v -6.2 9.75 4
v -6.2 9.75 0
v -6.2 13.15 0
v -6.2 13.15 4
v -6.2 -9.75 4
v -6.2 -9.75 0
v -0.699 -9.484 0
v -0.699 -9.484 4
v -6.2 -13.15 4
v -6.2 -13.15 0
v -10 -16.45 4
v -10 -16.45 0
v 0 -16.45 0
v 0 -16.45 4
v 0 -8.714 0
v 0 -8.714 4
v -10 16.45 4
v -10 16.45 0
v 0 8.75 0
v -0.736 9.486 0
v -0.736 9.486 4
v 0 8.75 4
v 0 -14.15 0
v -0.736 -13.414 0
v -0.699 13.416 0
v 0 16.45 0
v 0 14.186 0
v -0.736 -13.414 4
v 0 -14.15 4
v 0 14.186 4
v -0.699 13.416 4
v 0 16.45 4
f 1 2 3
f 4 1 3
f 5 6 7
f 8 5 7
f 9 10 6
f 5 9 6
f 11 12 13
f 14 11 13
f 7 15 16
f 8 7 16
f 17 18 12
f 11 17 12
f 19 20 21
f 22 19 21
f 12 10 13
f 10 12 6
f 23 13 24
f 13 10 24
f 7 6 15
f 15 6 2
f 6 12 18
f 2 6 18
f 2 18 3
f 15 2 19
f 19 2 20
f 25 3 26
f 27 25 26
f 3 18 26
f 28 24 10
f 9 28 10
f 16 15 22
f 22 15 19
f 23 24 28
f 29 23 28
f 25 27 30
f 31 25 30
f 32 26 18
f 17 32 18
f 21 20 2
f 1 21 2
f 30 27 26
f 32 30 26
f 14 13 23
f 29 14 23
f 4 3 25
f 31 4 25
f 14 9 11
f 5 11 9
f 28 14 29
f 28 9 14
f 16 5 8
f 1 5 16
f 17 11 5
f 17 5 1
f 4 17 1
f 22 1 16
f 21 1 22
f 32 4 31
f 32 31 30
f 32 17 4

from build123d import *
from OCP.BRepFilletAPI import BRepFilletAPI_MakeChamfer

# Parameters (mm, degrees)
BOSS_EXTRUDE1_DEPTH = 4
CHAMFER1_SIZE       = 0.7
CHAMFER1_SIZE2      = 0.736453843


with BuildPart() as part:
    # Sketch1 → Boss-Extrude1 (new body)
    with BuildSketch(Plane.XY):
        Polygon((-10, 0), (0, 0), (0, 9.45), (-6.2, 9.75), (-6.2, 13.15), (0, 13.45), (0, 16.45), (-10, 16.45), align=None)
        Polygon((-6.2, -9.75), (0, -9.45), (0, 0), (-10, 0), (-10, -16.45), (0, -16.45), (0, -13.45), (-6.2, -13.15), align=None)
    extrude(amount=BOSS_EXTRUDE1_DEPTH)

    # Chamfer1: one chamfer whose edges measure the first distance from different faces: ONE call of the kernel's chamfer builder (chamfer() names one face for all edges)
    chamfer1_edges_1 = [part.edges().sort_by_distance(p)[0] for p in [
        (0, 13.45, 2),
    ]]
    chamfer1_side_1 = [part.faces().sort_by_distance(p)[0] for p in [
        (-3.1, 13.3, 2),
    ]]
    chamfer1_edges_2 = [part.edges().sort_by_distance(p)[0] for p in [
        (0, 9.45, 2),
    ]]
    chamfer1_side_2 = [part.faces().sort_by_distance(p)[0] for p in [
        (0, 0, 2),
    ]]
    chamfer1_edges_3 = [part.edges().sort_by_distance(p)[0] for p in [
        (0, -9.45, 2),
    ]]
    chamfer1_side_3 = [part.faces().sort_by_distance(p)[0] for p in [
        (-3.1, -9.6, 2),
    ]]
    chamfer1_edges_4 = [part.edges().sort_by_distance(p)[0] for p in [
        (0, -13.45, 2),
    ]]
    chamfer1_side_4 = [part.faces().sort_by_distance(p)[0] for p in [
        (0, -14.95, 2),
    ]]
    chamfer1 = BRepFilletAPI_MakeChamfer(part.part.solid().wrapped)
    for e in chamfer1_edges_1:
        chamfer1.Add(CHAMFER1_SIZE, CHAMFER1_SIZE2, e.wrapped, chamfer1_side_1[0].wrapped)  # the first distance lies on this face
    for e in chamfer1_edges_2:
        chamfer1.Add(CHAMFER1_SIZE, CHAMFER1_SIZE2, e.wrapped, chamfer1_side_2[0].wrapped)  # the first distance lies on this face
    for e in chamfer1_edges_3:
        chamfer1.Add(CHAMFER1_SIZE, CHAMFER1_SIZE2, e.wrapped, chamfer1_side_3[0].wrapped)  # the first distance lies on this face
    for e in chamfer1_edges_4:
        chamfer1.Add(CHAMFER1_SIZE, CHAMFER1_SIZE2, e.wrapped, chamfer1_side_4[0].wrapped)  # the first distance lies on this face
    add(Compound.cast(chamfer1.Shape()), mode=Mode.REPLACE)


solid = part.part
